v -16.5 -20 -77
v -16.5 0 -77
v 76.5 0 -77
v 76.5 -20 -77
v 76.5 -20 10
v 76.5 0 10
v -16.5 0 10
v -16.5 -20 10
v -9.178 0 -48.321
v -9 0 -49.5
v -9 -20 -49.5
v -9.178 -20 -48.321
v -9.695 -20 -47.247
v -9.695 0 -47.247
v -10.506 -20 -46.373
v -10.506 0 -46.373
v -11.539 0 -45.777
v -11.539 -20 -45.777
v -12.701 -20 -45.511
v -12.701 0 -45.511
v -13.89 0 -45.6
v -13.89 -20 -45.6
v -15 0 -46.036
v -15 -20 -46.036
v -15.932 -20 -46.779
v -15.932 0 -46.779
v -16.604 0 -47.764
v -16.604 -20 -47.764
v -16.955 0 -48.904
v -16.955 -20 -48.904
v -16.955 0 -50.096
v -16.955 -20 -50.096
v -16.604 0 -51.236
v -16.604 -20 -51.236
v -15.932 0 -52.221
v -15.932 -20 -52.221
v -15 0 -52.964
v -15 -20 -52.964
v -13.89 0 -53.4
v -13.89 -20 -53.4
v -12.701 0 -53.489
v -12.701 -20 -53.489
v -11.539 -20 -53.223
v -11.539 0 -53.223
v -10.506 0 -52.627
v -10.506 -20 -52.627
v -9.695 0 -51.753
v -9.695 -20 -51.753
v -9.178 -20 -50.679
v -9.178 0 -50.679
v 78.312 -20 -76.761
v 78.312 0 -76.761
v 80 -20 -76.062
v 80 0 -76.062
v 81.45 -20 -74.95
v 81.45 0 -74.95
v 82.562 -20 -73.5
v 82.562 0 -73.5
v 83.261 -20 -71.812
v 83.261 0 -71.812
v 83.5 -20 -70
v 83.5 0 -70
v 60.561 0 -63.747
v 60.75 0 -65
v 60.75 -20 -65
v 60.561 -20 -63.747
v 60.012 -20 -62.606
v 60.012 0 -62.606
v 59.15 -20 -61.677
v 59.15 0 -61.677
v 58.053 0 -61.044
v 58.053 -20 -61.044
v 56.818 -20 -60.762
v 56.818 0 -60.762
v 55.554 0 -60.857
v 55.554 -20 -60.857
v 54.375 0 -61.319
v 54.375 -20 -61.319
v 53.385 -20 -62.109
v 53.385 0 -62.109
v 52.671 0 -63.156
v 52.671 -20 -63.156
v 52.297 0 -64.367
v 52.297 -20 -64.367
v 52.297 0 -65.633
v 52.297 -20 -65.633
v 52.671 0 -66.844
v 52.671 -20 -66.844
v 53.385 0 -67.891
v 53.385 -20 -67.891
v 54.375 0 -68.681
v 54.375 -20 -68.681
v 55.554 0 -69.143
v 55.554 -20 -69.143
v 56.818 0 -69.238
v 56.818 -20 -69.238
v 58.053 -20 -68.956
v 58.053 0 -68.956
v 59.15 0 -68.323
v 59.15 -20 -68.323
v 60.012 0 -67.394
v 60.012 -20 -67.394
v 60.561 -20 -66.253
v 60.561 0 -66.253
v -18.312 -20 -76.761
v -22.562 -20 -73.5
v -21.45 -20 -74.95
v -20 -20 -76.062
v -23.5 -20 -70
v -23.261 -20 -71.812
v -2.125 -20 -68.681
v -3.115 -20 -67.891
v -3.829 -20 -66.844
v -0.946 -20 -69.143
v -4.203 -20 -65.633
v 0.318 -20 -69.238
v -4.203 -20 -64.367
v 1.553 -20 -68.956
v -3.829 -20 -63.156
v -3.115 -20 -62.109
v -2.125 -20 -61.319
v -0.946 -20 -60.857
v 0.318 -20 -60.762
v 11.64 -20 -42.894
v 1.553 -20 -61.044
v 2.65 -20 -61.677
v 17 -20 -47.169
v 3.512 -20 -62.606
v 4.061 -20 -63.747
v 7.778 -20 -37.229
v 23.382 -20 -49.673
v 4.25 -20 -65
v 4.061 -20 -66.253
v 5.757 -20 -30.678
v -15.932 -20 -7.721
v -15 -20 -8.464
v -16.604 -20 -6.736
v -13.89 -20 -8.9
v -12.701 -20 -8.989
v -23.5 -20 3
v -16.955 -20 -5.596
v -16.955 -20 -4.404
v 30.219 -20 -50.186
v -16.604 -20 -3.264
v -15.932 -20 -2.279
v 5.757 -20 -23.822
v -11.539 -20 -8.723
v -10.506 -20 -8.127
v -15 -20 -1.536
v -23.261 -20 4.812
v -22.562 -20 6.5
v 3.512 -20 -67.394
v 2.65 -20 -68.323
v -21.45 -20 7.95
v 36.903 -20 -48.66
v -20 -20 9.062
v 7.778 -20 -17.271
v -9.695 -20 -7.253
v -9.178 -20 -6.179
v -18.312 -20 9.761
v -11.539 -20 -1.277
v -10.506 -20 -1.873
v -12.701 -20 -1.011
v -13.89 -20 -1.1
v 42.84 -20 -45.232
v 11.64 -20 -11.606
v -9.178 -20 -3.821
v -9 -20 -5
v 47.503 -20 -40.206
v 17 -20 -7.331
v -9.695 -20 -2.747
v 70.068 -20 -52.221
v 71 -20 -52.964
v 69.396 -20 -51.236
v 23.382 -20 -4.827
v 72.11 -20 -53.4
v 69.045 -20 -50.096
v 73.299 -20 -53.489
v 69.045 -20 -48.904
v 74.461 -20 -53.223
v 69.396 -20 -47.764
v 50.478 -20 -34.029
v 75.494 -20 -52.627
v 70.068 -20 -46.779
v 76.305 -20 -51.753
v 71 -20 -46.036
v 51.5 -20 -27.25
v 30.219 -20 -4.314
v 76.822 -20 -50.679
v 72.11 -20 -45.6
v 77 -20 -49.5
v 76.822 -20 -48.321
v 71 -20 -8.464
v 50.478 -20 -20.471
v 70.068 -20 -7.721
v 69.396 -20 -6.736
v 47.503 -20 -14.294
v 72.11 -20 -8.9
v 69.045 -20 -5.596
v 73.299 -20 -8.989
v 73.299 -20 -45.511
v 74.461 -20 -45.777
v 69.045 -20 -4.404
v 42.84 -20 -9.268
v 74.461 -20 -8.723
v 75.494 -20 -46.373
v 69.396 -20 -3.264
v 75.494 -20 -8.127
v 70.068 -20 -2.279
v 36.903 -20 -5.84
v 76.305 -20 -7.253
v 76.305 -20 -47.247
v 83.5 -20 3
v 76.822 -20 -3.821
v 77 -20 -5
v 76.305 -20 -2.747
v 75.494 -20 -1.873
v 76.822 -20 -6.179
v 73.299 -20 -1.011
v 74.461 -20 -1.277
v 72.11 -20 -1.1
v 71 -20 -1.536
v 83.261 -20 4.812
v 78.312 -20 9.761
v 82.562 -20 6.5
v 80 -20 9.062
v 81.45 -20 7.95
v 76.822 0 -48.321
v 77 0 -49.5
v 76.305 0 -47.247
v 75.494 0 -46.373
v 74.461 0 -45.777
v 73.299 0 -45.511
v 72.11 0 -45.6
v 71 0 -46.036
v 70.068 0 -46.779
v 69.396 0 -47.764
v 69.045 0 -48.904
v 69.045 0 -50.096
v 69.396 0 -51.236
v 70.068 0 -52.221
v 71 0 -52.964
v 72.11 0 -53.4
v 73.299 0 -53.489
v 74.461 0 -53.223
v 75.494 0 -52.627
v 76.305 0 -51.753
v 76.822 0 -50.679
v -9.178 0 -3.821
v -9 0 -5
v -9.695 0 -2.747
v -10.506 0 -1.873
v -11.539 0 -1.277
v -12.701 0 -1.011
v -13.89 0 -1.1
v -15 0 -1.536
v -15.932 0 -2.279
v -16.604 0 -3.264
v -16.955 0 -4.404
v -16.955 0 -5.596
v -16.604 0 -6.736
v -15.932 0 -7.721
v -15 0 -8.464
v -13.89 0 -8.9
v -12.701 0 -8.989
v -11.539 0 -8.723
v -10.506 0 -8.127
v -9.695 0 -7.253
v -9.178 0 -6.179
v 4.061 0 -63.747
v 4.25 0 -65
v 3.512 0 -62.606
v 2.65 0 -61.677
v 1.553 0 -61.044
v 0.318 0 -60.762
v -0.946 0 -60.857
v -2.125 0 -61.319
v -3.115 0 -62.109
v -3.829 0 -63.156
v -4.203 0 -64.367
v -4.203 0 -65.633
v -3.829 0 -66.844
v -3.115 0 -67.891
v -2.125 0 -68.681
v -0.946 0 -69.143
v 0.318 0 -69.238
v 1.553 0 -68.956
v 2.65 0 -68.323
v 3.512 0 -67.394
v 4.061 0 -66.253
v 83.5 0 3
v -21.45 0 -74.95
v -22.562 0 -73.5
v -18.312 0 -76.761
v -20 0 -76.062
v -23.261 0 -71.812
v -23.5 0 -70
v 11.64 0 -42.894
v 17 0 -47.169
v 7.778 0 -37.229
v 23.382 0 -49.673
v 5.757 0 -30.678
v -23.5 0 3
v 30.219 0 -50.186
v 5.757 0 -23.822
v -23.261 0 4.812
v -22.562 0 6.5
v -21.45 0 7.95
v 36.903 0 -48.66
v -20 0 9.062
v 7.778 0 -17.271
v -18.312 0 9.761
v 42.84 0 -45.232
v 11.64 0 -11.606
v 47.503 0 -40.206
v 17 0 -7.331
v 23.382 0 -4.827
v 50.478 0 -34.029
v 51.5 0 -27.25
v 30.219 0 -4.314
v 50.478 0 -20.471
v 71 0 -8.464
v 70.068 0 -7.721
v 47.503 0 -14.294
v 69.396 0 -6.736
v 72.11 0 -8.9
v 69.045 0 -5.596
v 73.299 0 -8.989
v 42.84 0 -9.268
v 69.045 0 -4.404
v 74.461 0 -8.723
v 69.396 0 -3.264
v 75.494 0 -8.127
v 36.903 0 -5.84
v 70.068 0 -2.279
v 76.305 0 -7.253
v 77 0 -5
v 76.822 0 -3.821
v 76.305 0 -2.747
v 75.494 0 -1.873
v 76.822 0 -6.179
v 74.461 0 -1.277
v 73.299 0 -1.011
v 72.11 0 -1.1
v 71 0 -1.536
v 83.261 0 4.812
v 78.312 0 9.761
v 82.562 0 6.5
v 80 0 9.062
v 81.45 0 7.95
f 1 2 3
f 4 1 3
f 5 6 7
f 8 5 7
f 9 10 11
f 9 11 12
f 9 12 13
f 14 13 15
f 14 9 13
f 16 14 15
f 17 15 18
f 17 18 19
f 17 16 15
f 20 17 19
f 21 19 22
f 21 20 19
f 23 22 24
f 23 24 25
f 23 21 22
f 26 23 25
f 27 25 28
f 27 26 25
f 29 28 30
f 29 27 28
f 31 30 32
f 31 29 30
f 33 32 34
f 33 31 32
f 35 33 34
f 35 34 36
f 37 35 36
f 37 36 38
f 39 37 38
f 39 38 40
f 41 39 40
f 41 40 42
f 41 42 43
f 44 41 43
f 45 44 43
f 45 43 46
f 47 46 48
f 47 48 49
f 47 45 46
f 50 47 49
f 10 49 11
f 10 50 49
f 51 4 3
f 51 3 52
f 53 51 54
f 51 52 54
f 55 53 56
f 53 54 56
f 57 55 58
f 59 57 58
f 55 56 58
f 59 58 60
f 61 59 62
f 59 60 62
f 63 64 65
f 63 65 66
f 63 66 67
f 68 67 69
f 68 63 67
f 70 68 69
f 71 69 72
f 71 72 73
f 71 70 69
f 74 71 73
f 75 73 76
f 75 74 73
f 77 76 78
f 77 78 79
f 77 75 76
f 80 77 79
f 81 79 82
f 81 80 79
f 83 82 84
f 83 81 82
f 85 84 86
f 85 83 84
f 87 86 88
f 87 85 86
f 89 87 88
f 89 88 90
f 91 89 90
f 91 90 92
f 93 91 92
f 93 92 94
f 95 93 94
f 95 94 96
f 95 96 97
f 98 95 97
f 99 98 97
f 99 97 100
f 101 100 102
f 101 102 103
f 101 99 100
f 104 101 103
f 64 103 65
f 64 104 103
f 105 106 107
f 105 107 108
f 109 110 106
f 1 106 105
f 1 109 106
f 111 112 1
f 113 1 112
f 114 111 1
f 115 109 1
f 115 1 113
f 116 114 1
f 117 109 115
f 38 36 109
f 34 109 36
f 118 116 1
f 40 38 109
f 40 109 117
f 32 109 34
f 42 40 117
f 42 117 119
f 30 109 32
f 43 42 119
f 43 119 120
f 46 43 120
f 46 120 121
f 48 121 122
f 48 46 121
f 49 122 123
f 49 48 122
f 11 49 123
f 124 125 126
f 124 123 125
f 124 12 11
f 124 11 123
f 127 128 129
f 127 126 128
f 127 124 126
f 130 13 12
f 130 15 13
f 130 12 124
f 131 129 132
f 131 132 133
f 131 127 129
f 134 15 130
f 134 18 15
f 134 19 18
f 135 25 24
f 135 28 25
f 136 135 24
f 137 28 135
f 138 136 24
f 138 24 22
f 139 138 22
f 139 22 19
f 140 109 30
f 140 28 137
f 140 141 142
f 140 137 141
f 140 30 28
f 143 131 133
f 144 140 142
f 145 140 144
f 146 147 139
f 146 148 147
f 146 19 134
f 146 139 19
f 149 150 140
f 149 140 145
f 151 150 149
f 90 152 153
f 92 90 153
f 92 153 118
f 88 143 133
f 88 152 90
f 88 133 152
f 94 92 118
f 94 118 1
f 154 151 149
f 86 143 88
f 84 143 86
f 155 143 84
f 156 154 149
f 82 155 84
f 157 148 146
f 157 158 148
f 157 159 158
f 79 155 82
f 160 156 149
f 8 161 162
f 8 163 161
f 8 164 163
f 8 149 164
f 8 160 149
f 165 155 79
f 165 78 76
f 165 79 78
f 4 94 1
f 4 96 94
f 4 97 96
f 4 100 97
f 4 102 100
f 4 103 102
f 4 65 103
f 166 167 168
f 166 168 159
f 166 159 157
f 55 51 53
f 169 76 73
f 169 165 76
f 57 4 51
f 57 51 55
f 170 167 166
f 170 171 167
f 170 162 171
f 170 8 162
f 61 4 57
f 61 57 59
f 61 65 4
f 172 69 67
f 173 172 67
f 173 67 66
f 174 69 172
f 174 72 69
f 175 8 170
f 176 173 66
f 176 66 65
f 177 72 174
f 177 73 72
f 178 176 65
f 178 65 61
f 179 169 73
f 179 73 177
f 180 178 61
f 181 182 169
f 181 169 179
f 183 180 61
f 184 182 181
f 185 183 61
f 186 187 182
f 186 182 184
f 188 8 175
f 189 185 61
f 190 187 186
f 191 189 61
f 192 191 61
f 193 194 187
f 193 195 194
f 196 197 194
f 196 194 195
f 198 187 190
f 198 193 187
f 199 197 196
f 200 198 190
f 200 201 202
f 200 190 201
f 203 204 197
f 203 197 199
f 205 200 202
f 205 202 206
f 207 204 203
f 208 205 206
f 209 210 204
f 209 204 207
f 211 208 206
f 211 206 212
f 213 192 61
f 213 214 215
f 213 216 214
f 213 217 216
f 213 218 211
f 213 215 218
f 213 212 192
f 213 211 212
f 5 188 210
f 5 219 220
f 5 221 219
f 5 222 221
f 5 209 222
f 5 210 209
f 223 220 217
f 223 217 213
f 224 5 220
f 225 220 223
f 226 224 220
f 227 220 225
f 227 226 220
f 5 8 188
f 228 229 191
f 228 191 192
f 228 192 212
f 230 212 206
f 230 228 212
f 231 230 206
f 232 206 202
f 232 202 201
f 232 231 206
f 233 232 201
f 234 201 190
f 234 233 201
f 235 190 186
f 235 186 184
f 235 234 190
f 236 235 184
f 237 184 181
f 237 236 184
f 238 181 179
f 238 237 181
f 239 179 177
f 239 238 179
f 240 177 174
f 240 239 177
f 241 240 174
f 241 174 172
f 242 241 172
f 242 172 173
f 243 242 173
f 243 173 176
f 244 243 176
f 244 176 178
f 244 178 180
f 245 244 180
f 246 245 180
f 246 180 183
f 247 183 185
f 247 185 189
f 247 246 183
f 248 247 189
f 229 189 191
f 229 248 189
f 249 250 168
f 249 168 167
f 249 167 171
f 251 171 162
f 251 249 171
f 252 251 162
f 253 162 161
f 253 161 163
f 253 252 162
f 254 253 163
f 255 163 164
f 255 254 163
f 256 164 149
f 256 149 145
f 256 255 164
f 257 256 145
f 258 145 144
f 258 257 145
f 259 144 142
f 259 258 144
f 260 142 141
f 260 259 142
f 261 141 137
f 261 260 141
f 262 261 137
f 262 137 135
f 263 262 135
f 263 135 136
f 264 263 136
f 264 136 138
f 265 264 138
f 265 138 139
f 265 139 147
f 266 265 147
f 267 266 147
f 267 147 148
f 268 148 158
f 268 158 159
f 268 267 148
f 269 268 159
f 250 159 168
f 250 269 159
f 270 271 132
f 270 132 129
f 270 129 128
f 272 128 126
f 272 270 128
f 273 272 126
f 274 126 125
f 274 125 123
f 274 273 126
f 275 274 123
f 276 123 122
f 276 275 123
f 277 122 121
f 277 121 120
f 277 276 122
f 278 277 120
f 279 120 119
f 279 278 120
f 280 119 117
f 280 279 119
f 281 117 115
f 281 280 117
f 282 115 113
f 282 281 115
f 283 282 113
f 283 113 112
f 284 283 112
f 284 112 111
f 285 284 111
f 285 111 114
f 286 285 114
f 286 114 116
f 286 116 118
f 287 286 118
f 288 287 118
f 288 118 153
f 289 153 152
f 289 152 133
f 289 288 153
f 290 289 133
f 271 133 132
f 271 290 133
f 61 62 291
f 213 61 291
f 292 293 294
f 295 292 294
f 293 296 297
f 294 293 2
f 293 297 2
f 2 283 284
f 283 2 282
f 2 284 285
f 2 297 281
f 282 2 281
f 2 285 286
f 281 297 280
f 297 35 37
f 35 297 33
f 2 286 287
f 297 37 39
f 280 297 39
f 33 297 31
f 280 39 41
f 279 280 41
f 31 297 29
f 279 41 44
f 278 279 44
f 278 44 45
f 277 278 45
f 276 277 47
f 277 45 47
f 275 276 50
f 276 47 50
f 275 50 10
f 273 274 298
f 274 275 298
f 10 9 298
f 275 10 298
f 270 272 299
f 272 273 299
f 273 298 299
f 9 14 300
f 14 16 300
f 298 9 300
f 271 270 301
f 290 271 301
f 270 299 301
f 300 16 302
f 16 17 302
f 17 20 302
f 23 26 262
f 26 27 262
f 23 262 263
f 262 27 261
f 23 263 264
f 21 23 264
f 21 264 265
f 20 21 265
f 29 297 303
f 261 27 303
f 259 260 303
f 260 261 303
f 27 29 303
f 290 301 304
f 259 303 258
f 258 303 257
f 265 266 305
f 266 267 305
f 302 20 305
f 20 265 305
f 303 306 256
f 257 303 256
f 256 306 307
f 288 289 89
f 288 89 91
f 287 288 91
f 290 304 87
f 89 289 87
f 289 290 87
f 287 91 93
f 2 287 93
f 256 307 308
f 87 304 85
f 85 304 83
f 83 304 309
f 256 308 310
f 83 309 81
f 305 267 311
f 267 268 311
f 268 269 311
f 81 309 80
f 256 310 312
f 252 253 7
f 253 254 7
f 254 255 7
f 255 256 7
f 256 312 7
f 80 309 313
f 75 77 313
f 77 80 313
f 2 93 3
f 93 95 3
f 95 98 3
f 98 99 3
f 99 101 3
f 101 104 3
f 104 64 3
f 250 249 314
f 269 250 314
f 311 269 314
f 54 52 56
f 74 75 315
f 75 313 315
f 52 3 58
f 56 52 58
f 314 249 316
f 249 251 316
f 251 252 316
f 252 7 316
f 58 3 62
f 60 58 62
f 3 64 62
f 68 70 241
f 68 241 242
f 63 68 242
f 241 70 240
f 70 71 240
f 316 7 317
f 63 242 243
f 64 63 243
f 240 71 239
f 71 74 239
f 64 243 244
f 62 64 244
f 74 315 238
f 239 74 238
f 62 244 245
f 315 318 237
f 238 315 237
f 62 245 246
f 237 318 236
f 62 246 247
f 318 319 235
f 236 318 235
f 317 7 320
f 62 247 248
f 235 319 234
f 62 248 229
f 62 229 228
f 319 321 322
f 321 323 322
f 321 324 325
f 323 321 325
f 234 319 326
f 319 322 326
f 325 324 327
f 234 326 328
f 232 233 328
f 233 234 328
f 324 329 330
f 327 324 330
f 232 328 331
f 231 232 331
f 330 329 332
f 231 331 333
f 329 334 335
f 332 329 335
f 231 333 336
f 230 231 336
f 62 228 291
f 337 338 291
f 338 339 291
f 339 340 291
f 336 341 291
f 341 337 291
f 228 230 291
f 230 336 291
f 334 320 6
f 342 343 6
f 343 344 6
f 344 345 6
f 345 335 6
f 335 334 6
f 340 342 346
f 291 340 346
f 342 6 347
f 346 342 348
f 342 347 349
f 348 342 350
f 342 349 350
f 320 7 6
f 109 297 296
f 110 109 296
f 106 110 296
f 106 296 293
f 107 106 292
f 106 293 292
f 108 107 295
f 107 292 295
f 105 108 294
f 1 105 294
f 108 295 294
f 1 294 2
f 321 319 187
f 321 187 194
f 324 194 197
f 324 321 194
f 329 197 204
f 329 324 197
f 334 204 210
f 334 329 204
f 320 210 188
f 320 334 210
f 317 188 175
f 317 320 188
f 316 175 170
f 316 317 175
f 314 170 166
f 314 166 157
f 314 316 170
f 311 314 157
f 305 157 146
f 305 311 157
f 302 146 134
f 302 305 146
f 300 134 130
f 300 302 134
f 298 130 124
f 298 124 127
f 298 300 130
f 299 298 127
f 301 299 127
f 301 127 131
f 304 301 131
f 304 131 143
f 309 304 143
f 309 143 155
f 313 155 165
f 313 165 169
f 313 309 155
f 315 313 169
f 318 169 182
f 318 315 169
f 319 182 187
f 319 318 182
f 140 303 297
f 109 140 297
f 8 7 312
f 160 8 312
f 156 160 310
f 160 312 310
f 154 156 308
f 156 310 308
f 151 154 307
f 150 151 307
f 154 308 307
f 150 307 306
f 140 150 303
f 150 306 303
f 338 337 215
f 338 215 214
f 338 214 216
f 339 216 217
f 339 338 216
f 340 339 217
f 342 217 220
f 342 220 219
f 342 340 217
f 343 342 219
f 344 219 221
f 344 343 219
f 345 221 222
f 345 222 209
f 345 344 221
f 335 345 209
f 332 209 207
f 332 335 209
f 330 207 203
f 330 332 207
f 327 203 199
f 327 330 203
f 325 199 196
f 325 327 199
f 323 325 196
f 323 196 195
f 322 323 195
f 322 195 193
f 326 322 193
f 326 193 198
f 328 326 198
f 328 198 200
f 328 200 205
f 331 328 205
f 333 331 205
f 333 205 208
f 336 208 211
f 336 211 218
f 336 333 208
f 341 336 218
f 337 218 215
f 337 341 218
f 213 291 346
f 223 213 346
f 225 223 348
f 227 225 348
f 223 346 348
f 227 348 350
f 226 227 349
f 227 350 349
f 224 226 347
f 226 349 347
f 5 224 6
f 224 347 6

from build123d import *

# Parameters (mm, degrees)
F0_R     = 4.25
F0_R_2   = 4
F0_R_3   = 23
F0_R_4   = 3.35
F1_DEPTH = 20


with BuildPart() as f1:
    # F0 (on Front) → F1 (new body)
    with BuildSketch(Plane.XZ):
        with BuildLine():
            Line((76.5, 10), (-16.5, 10))
            ThreePointArc((-16.5, 10), (-21.449747, 7.949747), (-23.5, 3))
            Line((-23.5, 3), (-23.5, -70))
            ThreePointArc((-23.5, -70), (-21.449747, -74.949747), (-16.5, -77))
            Line((-16.5, -77), (76.5, -77))
            ThreePointArc((76.5, -77), (81.449747, -74.949747), (83.5, -70))
            Line((83.5, -70), (83.5, 3))
            ThreePointArc((83.5, 3), (81.449747, 7.949747), (76.5, 10))
        make_face()
        with Locations((0, -65)):
            Circle(F0_R, mode=Mode.SUBTRACT)
        with Locations((-13, -49.5)):
            Circle(F0_R_2, mode=Mode.SUBTRACT)
        with Locations((56.5, -65)):
            Circle(F0_R, mode=Mode.SUBTRACT)
        with Locations((73, -49.5)):
            Circle(F0_R_2, mode=Mode.SUBTRACT)
        with Locations((28.5, -27.25)):
            Circle(F0_R_3, mode=Mode.SUBTRACT)
        with Locations((-13, -5)):
            Circle(F0_R_2, mode=Mode.SUBTRACT)
        Circle(F0_R_4, mode=Mode.SUBTRACT)
        with Locations((56.5, 0)):
            Circle(F0_R_4, mode=Mode.SUBTRACT)
        with Locations((73, -5)):
            Circle(F0_R_2, mode=Mode.SUBTRACT)
        Circle(F0_R_4)
        with Locations((56.5, 0)):
            Circle(F0_R_4)
    extrude(amount=F1_DEPTH)


solid = f1.part
